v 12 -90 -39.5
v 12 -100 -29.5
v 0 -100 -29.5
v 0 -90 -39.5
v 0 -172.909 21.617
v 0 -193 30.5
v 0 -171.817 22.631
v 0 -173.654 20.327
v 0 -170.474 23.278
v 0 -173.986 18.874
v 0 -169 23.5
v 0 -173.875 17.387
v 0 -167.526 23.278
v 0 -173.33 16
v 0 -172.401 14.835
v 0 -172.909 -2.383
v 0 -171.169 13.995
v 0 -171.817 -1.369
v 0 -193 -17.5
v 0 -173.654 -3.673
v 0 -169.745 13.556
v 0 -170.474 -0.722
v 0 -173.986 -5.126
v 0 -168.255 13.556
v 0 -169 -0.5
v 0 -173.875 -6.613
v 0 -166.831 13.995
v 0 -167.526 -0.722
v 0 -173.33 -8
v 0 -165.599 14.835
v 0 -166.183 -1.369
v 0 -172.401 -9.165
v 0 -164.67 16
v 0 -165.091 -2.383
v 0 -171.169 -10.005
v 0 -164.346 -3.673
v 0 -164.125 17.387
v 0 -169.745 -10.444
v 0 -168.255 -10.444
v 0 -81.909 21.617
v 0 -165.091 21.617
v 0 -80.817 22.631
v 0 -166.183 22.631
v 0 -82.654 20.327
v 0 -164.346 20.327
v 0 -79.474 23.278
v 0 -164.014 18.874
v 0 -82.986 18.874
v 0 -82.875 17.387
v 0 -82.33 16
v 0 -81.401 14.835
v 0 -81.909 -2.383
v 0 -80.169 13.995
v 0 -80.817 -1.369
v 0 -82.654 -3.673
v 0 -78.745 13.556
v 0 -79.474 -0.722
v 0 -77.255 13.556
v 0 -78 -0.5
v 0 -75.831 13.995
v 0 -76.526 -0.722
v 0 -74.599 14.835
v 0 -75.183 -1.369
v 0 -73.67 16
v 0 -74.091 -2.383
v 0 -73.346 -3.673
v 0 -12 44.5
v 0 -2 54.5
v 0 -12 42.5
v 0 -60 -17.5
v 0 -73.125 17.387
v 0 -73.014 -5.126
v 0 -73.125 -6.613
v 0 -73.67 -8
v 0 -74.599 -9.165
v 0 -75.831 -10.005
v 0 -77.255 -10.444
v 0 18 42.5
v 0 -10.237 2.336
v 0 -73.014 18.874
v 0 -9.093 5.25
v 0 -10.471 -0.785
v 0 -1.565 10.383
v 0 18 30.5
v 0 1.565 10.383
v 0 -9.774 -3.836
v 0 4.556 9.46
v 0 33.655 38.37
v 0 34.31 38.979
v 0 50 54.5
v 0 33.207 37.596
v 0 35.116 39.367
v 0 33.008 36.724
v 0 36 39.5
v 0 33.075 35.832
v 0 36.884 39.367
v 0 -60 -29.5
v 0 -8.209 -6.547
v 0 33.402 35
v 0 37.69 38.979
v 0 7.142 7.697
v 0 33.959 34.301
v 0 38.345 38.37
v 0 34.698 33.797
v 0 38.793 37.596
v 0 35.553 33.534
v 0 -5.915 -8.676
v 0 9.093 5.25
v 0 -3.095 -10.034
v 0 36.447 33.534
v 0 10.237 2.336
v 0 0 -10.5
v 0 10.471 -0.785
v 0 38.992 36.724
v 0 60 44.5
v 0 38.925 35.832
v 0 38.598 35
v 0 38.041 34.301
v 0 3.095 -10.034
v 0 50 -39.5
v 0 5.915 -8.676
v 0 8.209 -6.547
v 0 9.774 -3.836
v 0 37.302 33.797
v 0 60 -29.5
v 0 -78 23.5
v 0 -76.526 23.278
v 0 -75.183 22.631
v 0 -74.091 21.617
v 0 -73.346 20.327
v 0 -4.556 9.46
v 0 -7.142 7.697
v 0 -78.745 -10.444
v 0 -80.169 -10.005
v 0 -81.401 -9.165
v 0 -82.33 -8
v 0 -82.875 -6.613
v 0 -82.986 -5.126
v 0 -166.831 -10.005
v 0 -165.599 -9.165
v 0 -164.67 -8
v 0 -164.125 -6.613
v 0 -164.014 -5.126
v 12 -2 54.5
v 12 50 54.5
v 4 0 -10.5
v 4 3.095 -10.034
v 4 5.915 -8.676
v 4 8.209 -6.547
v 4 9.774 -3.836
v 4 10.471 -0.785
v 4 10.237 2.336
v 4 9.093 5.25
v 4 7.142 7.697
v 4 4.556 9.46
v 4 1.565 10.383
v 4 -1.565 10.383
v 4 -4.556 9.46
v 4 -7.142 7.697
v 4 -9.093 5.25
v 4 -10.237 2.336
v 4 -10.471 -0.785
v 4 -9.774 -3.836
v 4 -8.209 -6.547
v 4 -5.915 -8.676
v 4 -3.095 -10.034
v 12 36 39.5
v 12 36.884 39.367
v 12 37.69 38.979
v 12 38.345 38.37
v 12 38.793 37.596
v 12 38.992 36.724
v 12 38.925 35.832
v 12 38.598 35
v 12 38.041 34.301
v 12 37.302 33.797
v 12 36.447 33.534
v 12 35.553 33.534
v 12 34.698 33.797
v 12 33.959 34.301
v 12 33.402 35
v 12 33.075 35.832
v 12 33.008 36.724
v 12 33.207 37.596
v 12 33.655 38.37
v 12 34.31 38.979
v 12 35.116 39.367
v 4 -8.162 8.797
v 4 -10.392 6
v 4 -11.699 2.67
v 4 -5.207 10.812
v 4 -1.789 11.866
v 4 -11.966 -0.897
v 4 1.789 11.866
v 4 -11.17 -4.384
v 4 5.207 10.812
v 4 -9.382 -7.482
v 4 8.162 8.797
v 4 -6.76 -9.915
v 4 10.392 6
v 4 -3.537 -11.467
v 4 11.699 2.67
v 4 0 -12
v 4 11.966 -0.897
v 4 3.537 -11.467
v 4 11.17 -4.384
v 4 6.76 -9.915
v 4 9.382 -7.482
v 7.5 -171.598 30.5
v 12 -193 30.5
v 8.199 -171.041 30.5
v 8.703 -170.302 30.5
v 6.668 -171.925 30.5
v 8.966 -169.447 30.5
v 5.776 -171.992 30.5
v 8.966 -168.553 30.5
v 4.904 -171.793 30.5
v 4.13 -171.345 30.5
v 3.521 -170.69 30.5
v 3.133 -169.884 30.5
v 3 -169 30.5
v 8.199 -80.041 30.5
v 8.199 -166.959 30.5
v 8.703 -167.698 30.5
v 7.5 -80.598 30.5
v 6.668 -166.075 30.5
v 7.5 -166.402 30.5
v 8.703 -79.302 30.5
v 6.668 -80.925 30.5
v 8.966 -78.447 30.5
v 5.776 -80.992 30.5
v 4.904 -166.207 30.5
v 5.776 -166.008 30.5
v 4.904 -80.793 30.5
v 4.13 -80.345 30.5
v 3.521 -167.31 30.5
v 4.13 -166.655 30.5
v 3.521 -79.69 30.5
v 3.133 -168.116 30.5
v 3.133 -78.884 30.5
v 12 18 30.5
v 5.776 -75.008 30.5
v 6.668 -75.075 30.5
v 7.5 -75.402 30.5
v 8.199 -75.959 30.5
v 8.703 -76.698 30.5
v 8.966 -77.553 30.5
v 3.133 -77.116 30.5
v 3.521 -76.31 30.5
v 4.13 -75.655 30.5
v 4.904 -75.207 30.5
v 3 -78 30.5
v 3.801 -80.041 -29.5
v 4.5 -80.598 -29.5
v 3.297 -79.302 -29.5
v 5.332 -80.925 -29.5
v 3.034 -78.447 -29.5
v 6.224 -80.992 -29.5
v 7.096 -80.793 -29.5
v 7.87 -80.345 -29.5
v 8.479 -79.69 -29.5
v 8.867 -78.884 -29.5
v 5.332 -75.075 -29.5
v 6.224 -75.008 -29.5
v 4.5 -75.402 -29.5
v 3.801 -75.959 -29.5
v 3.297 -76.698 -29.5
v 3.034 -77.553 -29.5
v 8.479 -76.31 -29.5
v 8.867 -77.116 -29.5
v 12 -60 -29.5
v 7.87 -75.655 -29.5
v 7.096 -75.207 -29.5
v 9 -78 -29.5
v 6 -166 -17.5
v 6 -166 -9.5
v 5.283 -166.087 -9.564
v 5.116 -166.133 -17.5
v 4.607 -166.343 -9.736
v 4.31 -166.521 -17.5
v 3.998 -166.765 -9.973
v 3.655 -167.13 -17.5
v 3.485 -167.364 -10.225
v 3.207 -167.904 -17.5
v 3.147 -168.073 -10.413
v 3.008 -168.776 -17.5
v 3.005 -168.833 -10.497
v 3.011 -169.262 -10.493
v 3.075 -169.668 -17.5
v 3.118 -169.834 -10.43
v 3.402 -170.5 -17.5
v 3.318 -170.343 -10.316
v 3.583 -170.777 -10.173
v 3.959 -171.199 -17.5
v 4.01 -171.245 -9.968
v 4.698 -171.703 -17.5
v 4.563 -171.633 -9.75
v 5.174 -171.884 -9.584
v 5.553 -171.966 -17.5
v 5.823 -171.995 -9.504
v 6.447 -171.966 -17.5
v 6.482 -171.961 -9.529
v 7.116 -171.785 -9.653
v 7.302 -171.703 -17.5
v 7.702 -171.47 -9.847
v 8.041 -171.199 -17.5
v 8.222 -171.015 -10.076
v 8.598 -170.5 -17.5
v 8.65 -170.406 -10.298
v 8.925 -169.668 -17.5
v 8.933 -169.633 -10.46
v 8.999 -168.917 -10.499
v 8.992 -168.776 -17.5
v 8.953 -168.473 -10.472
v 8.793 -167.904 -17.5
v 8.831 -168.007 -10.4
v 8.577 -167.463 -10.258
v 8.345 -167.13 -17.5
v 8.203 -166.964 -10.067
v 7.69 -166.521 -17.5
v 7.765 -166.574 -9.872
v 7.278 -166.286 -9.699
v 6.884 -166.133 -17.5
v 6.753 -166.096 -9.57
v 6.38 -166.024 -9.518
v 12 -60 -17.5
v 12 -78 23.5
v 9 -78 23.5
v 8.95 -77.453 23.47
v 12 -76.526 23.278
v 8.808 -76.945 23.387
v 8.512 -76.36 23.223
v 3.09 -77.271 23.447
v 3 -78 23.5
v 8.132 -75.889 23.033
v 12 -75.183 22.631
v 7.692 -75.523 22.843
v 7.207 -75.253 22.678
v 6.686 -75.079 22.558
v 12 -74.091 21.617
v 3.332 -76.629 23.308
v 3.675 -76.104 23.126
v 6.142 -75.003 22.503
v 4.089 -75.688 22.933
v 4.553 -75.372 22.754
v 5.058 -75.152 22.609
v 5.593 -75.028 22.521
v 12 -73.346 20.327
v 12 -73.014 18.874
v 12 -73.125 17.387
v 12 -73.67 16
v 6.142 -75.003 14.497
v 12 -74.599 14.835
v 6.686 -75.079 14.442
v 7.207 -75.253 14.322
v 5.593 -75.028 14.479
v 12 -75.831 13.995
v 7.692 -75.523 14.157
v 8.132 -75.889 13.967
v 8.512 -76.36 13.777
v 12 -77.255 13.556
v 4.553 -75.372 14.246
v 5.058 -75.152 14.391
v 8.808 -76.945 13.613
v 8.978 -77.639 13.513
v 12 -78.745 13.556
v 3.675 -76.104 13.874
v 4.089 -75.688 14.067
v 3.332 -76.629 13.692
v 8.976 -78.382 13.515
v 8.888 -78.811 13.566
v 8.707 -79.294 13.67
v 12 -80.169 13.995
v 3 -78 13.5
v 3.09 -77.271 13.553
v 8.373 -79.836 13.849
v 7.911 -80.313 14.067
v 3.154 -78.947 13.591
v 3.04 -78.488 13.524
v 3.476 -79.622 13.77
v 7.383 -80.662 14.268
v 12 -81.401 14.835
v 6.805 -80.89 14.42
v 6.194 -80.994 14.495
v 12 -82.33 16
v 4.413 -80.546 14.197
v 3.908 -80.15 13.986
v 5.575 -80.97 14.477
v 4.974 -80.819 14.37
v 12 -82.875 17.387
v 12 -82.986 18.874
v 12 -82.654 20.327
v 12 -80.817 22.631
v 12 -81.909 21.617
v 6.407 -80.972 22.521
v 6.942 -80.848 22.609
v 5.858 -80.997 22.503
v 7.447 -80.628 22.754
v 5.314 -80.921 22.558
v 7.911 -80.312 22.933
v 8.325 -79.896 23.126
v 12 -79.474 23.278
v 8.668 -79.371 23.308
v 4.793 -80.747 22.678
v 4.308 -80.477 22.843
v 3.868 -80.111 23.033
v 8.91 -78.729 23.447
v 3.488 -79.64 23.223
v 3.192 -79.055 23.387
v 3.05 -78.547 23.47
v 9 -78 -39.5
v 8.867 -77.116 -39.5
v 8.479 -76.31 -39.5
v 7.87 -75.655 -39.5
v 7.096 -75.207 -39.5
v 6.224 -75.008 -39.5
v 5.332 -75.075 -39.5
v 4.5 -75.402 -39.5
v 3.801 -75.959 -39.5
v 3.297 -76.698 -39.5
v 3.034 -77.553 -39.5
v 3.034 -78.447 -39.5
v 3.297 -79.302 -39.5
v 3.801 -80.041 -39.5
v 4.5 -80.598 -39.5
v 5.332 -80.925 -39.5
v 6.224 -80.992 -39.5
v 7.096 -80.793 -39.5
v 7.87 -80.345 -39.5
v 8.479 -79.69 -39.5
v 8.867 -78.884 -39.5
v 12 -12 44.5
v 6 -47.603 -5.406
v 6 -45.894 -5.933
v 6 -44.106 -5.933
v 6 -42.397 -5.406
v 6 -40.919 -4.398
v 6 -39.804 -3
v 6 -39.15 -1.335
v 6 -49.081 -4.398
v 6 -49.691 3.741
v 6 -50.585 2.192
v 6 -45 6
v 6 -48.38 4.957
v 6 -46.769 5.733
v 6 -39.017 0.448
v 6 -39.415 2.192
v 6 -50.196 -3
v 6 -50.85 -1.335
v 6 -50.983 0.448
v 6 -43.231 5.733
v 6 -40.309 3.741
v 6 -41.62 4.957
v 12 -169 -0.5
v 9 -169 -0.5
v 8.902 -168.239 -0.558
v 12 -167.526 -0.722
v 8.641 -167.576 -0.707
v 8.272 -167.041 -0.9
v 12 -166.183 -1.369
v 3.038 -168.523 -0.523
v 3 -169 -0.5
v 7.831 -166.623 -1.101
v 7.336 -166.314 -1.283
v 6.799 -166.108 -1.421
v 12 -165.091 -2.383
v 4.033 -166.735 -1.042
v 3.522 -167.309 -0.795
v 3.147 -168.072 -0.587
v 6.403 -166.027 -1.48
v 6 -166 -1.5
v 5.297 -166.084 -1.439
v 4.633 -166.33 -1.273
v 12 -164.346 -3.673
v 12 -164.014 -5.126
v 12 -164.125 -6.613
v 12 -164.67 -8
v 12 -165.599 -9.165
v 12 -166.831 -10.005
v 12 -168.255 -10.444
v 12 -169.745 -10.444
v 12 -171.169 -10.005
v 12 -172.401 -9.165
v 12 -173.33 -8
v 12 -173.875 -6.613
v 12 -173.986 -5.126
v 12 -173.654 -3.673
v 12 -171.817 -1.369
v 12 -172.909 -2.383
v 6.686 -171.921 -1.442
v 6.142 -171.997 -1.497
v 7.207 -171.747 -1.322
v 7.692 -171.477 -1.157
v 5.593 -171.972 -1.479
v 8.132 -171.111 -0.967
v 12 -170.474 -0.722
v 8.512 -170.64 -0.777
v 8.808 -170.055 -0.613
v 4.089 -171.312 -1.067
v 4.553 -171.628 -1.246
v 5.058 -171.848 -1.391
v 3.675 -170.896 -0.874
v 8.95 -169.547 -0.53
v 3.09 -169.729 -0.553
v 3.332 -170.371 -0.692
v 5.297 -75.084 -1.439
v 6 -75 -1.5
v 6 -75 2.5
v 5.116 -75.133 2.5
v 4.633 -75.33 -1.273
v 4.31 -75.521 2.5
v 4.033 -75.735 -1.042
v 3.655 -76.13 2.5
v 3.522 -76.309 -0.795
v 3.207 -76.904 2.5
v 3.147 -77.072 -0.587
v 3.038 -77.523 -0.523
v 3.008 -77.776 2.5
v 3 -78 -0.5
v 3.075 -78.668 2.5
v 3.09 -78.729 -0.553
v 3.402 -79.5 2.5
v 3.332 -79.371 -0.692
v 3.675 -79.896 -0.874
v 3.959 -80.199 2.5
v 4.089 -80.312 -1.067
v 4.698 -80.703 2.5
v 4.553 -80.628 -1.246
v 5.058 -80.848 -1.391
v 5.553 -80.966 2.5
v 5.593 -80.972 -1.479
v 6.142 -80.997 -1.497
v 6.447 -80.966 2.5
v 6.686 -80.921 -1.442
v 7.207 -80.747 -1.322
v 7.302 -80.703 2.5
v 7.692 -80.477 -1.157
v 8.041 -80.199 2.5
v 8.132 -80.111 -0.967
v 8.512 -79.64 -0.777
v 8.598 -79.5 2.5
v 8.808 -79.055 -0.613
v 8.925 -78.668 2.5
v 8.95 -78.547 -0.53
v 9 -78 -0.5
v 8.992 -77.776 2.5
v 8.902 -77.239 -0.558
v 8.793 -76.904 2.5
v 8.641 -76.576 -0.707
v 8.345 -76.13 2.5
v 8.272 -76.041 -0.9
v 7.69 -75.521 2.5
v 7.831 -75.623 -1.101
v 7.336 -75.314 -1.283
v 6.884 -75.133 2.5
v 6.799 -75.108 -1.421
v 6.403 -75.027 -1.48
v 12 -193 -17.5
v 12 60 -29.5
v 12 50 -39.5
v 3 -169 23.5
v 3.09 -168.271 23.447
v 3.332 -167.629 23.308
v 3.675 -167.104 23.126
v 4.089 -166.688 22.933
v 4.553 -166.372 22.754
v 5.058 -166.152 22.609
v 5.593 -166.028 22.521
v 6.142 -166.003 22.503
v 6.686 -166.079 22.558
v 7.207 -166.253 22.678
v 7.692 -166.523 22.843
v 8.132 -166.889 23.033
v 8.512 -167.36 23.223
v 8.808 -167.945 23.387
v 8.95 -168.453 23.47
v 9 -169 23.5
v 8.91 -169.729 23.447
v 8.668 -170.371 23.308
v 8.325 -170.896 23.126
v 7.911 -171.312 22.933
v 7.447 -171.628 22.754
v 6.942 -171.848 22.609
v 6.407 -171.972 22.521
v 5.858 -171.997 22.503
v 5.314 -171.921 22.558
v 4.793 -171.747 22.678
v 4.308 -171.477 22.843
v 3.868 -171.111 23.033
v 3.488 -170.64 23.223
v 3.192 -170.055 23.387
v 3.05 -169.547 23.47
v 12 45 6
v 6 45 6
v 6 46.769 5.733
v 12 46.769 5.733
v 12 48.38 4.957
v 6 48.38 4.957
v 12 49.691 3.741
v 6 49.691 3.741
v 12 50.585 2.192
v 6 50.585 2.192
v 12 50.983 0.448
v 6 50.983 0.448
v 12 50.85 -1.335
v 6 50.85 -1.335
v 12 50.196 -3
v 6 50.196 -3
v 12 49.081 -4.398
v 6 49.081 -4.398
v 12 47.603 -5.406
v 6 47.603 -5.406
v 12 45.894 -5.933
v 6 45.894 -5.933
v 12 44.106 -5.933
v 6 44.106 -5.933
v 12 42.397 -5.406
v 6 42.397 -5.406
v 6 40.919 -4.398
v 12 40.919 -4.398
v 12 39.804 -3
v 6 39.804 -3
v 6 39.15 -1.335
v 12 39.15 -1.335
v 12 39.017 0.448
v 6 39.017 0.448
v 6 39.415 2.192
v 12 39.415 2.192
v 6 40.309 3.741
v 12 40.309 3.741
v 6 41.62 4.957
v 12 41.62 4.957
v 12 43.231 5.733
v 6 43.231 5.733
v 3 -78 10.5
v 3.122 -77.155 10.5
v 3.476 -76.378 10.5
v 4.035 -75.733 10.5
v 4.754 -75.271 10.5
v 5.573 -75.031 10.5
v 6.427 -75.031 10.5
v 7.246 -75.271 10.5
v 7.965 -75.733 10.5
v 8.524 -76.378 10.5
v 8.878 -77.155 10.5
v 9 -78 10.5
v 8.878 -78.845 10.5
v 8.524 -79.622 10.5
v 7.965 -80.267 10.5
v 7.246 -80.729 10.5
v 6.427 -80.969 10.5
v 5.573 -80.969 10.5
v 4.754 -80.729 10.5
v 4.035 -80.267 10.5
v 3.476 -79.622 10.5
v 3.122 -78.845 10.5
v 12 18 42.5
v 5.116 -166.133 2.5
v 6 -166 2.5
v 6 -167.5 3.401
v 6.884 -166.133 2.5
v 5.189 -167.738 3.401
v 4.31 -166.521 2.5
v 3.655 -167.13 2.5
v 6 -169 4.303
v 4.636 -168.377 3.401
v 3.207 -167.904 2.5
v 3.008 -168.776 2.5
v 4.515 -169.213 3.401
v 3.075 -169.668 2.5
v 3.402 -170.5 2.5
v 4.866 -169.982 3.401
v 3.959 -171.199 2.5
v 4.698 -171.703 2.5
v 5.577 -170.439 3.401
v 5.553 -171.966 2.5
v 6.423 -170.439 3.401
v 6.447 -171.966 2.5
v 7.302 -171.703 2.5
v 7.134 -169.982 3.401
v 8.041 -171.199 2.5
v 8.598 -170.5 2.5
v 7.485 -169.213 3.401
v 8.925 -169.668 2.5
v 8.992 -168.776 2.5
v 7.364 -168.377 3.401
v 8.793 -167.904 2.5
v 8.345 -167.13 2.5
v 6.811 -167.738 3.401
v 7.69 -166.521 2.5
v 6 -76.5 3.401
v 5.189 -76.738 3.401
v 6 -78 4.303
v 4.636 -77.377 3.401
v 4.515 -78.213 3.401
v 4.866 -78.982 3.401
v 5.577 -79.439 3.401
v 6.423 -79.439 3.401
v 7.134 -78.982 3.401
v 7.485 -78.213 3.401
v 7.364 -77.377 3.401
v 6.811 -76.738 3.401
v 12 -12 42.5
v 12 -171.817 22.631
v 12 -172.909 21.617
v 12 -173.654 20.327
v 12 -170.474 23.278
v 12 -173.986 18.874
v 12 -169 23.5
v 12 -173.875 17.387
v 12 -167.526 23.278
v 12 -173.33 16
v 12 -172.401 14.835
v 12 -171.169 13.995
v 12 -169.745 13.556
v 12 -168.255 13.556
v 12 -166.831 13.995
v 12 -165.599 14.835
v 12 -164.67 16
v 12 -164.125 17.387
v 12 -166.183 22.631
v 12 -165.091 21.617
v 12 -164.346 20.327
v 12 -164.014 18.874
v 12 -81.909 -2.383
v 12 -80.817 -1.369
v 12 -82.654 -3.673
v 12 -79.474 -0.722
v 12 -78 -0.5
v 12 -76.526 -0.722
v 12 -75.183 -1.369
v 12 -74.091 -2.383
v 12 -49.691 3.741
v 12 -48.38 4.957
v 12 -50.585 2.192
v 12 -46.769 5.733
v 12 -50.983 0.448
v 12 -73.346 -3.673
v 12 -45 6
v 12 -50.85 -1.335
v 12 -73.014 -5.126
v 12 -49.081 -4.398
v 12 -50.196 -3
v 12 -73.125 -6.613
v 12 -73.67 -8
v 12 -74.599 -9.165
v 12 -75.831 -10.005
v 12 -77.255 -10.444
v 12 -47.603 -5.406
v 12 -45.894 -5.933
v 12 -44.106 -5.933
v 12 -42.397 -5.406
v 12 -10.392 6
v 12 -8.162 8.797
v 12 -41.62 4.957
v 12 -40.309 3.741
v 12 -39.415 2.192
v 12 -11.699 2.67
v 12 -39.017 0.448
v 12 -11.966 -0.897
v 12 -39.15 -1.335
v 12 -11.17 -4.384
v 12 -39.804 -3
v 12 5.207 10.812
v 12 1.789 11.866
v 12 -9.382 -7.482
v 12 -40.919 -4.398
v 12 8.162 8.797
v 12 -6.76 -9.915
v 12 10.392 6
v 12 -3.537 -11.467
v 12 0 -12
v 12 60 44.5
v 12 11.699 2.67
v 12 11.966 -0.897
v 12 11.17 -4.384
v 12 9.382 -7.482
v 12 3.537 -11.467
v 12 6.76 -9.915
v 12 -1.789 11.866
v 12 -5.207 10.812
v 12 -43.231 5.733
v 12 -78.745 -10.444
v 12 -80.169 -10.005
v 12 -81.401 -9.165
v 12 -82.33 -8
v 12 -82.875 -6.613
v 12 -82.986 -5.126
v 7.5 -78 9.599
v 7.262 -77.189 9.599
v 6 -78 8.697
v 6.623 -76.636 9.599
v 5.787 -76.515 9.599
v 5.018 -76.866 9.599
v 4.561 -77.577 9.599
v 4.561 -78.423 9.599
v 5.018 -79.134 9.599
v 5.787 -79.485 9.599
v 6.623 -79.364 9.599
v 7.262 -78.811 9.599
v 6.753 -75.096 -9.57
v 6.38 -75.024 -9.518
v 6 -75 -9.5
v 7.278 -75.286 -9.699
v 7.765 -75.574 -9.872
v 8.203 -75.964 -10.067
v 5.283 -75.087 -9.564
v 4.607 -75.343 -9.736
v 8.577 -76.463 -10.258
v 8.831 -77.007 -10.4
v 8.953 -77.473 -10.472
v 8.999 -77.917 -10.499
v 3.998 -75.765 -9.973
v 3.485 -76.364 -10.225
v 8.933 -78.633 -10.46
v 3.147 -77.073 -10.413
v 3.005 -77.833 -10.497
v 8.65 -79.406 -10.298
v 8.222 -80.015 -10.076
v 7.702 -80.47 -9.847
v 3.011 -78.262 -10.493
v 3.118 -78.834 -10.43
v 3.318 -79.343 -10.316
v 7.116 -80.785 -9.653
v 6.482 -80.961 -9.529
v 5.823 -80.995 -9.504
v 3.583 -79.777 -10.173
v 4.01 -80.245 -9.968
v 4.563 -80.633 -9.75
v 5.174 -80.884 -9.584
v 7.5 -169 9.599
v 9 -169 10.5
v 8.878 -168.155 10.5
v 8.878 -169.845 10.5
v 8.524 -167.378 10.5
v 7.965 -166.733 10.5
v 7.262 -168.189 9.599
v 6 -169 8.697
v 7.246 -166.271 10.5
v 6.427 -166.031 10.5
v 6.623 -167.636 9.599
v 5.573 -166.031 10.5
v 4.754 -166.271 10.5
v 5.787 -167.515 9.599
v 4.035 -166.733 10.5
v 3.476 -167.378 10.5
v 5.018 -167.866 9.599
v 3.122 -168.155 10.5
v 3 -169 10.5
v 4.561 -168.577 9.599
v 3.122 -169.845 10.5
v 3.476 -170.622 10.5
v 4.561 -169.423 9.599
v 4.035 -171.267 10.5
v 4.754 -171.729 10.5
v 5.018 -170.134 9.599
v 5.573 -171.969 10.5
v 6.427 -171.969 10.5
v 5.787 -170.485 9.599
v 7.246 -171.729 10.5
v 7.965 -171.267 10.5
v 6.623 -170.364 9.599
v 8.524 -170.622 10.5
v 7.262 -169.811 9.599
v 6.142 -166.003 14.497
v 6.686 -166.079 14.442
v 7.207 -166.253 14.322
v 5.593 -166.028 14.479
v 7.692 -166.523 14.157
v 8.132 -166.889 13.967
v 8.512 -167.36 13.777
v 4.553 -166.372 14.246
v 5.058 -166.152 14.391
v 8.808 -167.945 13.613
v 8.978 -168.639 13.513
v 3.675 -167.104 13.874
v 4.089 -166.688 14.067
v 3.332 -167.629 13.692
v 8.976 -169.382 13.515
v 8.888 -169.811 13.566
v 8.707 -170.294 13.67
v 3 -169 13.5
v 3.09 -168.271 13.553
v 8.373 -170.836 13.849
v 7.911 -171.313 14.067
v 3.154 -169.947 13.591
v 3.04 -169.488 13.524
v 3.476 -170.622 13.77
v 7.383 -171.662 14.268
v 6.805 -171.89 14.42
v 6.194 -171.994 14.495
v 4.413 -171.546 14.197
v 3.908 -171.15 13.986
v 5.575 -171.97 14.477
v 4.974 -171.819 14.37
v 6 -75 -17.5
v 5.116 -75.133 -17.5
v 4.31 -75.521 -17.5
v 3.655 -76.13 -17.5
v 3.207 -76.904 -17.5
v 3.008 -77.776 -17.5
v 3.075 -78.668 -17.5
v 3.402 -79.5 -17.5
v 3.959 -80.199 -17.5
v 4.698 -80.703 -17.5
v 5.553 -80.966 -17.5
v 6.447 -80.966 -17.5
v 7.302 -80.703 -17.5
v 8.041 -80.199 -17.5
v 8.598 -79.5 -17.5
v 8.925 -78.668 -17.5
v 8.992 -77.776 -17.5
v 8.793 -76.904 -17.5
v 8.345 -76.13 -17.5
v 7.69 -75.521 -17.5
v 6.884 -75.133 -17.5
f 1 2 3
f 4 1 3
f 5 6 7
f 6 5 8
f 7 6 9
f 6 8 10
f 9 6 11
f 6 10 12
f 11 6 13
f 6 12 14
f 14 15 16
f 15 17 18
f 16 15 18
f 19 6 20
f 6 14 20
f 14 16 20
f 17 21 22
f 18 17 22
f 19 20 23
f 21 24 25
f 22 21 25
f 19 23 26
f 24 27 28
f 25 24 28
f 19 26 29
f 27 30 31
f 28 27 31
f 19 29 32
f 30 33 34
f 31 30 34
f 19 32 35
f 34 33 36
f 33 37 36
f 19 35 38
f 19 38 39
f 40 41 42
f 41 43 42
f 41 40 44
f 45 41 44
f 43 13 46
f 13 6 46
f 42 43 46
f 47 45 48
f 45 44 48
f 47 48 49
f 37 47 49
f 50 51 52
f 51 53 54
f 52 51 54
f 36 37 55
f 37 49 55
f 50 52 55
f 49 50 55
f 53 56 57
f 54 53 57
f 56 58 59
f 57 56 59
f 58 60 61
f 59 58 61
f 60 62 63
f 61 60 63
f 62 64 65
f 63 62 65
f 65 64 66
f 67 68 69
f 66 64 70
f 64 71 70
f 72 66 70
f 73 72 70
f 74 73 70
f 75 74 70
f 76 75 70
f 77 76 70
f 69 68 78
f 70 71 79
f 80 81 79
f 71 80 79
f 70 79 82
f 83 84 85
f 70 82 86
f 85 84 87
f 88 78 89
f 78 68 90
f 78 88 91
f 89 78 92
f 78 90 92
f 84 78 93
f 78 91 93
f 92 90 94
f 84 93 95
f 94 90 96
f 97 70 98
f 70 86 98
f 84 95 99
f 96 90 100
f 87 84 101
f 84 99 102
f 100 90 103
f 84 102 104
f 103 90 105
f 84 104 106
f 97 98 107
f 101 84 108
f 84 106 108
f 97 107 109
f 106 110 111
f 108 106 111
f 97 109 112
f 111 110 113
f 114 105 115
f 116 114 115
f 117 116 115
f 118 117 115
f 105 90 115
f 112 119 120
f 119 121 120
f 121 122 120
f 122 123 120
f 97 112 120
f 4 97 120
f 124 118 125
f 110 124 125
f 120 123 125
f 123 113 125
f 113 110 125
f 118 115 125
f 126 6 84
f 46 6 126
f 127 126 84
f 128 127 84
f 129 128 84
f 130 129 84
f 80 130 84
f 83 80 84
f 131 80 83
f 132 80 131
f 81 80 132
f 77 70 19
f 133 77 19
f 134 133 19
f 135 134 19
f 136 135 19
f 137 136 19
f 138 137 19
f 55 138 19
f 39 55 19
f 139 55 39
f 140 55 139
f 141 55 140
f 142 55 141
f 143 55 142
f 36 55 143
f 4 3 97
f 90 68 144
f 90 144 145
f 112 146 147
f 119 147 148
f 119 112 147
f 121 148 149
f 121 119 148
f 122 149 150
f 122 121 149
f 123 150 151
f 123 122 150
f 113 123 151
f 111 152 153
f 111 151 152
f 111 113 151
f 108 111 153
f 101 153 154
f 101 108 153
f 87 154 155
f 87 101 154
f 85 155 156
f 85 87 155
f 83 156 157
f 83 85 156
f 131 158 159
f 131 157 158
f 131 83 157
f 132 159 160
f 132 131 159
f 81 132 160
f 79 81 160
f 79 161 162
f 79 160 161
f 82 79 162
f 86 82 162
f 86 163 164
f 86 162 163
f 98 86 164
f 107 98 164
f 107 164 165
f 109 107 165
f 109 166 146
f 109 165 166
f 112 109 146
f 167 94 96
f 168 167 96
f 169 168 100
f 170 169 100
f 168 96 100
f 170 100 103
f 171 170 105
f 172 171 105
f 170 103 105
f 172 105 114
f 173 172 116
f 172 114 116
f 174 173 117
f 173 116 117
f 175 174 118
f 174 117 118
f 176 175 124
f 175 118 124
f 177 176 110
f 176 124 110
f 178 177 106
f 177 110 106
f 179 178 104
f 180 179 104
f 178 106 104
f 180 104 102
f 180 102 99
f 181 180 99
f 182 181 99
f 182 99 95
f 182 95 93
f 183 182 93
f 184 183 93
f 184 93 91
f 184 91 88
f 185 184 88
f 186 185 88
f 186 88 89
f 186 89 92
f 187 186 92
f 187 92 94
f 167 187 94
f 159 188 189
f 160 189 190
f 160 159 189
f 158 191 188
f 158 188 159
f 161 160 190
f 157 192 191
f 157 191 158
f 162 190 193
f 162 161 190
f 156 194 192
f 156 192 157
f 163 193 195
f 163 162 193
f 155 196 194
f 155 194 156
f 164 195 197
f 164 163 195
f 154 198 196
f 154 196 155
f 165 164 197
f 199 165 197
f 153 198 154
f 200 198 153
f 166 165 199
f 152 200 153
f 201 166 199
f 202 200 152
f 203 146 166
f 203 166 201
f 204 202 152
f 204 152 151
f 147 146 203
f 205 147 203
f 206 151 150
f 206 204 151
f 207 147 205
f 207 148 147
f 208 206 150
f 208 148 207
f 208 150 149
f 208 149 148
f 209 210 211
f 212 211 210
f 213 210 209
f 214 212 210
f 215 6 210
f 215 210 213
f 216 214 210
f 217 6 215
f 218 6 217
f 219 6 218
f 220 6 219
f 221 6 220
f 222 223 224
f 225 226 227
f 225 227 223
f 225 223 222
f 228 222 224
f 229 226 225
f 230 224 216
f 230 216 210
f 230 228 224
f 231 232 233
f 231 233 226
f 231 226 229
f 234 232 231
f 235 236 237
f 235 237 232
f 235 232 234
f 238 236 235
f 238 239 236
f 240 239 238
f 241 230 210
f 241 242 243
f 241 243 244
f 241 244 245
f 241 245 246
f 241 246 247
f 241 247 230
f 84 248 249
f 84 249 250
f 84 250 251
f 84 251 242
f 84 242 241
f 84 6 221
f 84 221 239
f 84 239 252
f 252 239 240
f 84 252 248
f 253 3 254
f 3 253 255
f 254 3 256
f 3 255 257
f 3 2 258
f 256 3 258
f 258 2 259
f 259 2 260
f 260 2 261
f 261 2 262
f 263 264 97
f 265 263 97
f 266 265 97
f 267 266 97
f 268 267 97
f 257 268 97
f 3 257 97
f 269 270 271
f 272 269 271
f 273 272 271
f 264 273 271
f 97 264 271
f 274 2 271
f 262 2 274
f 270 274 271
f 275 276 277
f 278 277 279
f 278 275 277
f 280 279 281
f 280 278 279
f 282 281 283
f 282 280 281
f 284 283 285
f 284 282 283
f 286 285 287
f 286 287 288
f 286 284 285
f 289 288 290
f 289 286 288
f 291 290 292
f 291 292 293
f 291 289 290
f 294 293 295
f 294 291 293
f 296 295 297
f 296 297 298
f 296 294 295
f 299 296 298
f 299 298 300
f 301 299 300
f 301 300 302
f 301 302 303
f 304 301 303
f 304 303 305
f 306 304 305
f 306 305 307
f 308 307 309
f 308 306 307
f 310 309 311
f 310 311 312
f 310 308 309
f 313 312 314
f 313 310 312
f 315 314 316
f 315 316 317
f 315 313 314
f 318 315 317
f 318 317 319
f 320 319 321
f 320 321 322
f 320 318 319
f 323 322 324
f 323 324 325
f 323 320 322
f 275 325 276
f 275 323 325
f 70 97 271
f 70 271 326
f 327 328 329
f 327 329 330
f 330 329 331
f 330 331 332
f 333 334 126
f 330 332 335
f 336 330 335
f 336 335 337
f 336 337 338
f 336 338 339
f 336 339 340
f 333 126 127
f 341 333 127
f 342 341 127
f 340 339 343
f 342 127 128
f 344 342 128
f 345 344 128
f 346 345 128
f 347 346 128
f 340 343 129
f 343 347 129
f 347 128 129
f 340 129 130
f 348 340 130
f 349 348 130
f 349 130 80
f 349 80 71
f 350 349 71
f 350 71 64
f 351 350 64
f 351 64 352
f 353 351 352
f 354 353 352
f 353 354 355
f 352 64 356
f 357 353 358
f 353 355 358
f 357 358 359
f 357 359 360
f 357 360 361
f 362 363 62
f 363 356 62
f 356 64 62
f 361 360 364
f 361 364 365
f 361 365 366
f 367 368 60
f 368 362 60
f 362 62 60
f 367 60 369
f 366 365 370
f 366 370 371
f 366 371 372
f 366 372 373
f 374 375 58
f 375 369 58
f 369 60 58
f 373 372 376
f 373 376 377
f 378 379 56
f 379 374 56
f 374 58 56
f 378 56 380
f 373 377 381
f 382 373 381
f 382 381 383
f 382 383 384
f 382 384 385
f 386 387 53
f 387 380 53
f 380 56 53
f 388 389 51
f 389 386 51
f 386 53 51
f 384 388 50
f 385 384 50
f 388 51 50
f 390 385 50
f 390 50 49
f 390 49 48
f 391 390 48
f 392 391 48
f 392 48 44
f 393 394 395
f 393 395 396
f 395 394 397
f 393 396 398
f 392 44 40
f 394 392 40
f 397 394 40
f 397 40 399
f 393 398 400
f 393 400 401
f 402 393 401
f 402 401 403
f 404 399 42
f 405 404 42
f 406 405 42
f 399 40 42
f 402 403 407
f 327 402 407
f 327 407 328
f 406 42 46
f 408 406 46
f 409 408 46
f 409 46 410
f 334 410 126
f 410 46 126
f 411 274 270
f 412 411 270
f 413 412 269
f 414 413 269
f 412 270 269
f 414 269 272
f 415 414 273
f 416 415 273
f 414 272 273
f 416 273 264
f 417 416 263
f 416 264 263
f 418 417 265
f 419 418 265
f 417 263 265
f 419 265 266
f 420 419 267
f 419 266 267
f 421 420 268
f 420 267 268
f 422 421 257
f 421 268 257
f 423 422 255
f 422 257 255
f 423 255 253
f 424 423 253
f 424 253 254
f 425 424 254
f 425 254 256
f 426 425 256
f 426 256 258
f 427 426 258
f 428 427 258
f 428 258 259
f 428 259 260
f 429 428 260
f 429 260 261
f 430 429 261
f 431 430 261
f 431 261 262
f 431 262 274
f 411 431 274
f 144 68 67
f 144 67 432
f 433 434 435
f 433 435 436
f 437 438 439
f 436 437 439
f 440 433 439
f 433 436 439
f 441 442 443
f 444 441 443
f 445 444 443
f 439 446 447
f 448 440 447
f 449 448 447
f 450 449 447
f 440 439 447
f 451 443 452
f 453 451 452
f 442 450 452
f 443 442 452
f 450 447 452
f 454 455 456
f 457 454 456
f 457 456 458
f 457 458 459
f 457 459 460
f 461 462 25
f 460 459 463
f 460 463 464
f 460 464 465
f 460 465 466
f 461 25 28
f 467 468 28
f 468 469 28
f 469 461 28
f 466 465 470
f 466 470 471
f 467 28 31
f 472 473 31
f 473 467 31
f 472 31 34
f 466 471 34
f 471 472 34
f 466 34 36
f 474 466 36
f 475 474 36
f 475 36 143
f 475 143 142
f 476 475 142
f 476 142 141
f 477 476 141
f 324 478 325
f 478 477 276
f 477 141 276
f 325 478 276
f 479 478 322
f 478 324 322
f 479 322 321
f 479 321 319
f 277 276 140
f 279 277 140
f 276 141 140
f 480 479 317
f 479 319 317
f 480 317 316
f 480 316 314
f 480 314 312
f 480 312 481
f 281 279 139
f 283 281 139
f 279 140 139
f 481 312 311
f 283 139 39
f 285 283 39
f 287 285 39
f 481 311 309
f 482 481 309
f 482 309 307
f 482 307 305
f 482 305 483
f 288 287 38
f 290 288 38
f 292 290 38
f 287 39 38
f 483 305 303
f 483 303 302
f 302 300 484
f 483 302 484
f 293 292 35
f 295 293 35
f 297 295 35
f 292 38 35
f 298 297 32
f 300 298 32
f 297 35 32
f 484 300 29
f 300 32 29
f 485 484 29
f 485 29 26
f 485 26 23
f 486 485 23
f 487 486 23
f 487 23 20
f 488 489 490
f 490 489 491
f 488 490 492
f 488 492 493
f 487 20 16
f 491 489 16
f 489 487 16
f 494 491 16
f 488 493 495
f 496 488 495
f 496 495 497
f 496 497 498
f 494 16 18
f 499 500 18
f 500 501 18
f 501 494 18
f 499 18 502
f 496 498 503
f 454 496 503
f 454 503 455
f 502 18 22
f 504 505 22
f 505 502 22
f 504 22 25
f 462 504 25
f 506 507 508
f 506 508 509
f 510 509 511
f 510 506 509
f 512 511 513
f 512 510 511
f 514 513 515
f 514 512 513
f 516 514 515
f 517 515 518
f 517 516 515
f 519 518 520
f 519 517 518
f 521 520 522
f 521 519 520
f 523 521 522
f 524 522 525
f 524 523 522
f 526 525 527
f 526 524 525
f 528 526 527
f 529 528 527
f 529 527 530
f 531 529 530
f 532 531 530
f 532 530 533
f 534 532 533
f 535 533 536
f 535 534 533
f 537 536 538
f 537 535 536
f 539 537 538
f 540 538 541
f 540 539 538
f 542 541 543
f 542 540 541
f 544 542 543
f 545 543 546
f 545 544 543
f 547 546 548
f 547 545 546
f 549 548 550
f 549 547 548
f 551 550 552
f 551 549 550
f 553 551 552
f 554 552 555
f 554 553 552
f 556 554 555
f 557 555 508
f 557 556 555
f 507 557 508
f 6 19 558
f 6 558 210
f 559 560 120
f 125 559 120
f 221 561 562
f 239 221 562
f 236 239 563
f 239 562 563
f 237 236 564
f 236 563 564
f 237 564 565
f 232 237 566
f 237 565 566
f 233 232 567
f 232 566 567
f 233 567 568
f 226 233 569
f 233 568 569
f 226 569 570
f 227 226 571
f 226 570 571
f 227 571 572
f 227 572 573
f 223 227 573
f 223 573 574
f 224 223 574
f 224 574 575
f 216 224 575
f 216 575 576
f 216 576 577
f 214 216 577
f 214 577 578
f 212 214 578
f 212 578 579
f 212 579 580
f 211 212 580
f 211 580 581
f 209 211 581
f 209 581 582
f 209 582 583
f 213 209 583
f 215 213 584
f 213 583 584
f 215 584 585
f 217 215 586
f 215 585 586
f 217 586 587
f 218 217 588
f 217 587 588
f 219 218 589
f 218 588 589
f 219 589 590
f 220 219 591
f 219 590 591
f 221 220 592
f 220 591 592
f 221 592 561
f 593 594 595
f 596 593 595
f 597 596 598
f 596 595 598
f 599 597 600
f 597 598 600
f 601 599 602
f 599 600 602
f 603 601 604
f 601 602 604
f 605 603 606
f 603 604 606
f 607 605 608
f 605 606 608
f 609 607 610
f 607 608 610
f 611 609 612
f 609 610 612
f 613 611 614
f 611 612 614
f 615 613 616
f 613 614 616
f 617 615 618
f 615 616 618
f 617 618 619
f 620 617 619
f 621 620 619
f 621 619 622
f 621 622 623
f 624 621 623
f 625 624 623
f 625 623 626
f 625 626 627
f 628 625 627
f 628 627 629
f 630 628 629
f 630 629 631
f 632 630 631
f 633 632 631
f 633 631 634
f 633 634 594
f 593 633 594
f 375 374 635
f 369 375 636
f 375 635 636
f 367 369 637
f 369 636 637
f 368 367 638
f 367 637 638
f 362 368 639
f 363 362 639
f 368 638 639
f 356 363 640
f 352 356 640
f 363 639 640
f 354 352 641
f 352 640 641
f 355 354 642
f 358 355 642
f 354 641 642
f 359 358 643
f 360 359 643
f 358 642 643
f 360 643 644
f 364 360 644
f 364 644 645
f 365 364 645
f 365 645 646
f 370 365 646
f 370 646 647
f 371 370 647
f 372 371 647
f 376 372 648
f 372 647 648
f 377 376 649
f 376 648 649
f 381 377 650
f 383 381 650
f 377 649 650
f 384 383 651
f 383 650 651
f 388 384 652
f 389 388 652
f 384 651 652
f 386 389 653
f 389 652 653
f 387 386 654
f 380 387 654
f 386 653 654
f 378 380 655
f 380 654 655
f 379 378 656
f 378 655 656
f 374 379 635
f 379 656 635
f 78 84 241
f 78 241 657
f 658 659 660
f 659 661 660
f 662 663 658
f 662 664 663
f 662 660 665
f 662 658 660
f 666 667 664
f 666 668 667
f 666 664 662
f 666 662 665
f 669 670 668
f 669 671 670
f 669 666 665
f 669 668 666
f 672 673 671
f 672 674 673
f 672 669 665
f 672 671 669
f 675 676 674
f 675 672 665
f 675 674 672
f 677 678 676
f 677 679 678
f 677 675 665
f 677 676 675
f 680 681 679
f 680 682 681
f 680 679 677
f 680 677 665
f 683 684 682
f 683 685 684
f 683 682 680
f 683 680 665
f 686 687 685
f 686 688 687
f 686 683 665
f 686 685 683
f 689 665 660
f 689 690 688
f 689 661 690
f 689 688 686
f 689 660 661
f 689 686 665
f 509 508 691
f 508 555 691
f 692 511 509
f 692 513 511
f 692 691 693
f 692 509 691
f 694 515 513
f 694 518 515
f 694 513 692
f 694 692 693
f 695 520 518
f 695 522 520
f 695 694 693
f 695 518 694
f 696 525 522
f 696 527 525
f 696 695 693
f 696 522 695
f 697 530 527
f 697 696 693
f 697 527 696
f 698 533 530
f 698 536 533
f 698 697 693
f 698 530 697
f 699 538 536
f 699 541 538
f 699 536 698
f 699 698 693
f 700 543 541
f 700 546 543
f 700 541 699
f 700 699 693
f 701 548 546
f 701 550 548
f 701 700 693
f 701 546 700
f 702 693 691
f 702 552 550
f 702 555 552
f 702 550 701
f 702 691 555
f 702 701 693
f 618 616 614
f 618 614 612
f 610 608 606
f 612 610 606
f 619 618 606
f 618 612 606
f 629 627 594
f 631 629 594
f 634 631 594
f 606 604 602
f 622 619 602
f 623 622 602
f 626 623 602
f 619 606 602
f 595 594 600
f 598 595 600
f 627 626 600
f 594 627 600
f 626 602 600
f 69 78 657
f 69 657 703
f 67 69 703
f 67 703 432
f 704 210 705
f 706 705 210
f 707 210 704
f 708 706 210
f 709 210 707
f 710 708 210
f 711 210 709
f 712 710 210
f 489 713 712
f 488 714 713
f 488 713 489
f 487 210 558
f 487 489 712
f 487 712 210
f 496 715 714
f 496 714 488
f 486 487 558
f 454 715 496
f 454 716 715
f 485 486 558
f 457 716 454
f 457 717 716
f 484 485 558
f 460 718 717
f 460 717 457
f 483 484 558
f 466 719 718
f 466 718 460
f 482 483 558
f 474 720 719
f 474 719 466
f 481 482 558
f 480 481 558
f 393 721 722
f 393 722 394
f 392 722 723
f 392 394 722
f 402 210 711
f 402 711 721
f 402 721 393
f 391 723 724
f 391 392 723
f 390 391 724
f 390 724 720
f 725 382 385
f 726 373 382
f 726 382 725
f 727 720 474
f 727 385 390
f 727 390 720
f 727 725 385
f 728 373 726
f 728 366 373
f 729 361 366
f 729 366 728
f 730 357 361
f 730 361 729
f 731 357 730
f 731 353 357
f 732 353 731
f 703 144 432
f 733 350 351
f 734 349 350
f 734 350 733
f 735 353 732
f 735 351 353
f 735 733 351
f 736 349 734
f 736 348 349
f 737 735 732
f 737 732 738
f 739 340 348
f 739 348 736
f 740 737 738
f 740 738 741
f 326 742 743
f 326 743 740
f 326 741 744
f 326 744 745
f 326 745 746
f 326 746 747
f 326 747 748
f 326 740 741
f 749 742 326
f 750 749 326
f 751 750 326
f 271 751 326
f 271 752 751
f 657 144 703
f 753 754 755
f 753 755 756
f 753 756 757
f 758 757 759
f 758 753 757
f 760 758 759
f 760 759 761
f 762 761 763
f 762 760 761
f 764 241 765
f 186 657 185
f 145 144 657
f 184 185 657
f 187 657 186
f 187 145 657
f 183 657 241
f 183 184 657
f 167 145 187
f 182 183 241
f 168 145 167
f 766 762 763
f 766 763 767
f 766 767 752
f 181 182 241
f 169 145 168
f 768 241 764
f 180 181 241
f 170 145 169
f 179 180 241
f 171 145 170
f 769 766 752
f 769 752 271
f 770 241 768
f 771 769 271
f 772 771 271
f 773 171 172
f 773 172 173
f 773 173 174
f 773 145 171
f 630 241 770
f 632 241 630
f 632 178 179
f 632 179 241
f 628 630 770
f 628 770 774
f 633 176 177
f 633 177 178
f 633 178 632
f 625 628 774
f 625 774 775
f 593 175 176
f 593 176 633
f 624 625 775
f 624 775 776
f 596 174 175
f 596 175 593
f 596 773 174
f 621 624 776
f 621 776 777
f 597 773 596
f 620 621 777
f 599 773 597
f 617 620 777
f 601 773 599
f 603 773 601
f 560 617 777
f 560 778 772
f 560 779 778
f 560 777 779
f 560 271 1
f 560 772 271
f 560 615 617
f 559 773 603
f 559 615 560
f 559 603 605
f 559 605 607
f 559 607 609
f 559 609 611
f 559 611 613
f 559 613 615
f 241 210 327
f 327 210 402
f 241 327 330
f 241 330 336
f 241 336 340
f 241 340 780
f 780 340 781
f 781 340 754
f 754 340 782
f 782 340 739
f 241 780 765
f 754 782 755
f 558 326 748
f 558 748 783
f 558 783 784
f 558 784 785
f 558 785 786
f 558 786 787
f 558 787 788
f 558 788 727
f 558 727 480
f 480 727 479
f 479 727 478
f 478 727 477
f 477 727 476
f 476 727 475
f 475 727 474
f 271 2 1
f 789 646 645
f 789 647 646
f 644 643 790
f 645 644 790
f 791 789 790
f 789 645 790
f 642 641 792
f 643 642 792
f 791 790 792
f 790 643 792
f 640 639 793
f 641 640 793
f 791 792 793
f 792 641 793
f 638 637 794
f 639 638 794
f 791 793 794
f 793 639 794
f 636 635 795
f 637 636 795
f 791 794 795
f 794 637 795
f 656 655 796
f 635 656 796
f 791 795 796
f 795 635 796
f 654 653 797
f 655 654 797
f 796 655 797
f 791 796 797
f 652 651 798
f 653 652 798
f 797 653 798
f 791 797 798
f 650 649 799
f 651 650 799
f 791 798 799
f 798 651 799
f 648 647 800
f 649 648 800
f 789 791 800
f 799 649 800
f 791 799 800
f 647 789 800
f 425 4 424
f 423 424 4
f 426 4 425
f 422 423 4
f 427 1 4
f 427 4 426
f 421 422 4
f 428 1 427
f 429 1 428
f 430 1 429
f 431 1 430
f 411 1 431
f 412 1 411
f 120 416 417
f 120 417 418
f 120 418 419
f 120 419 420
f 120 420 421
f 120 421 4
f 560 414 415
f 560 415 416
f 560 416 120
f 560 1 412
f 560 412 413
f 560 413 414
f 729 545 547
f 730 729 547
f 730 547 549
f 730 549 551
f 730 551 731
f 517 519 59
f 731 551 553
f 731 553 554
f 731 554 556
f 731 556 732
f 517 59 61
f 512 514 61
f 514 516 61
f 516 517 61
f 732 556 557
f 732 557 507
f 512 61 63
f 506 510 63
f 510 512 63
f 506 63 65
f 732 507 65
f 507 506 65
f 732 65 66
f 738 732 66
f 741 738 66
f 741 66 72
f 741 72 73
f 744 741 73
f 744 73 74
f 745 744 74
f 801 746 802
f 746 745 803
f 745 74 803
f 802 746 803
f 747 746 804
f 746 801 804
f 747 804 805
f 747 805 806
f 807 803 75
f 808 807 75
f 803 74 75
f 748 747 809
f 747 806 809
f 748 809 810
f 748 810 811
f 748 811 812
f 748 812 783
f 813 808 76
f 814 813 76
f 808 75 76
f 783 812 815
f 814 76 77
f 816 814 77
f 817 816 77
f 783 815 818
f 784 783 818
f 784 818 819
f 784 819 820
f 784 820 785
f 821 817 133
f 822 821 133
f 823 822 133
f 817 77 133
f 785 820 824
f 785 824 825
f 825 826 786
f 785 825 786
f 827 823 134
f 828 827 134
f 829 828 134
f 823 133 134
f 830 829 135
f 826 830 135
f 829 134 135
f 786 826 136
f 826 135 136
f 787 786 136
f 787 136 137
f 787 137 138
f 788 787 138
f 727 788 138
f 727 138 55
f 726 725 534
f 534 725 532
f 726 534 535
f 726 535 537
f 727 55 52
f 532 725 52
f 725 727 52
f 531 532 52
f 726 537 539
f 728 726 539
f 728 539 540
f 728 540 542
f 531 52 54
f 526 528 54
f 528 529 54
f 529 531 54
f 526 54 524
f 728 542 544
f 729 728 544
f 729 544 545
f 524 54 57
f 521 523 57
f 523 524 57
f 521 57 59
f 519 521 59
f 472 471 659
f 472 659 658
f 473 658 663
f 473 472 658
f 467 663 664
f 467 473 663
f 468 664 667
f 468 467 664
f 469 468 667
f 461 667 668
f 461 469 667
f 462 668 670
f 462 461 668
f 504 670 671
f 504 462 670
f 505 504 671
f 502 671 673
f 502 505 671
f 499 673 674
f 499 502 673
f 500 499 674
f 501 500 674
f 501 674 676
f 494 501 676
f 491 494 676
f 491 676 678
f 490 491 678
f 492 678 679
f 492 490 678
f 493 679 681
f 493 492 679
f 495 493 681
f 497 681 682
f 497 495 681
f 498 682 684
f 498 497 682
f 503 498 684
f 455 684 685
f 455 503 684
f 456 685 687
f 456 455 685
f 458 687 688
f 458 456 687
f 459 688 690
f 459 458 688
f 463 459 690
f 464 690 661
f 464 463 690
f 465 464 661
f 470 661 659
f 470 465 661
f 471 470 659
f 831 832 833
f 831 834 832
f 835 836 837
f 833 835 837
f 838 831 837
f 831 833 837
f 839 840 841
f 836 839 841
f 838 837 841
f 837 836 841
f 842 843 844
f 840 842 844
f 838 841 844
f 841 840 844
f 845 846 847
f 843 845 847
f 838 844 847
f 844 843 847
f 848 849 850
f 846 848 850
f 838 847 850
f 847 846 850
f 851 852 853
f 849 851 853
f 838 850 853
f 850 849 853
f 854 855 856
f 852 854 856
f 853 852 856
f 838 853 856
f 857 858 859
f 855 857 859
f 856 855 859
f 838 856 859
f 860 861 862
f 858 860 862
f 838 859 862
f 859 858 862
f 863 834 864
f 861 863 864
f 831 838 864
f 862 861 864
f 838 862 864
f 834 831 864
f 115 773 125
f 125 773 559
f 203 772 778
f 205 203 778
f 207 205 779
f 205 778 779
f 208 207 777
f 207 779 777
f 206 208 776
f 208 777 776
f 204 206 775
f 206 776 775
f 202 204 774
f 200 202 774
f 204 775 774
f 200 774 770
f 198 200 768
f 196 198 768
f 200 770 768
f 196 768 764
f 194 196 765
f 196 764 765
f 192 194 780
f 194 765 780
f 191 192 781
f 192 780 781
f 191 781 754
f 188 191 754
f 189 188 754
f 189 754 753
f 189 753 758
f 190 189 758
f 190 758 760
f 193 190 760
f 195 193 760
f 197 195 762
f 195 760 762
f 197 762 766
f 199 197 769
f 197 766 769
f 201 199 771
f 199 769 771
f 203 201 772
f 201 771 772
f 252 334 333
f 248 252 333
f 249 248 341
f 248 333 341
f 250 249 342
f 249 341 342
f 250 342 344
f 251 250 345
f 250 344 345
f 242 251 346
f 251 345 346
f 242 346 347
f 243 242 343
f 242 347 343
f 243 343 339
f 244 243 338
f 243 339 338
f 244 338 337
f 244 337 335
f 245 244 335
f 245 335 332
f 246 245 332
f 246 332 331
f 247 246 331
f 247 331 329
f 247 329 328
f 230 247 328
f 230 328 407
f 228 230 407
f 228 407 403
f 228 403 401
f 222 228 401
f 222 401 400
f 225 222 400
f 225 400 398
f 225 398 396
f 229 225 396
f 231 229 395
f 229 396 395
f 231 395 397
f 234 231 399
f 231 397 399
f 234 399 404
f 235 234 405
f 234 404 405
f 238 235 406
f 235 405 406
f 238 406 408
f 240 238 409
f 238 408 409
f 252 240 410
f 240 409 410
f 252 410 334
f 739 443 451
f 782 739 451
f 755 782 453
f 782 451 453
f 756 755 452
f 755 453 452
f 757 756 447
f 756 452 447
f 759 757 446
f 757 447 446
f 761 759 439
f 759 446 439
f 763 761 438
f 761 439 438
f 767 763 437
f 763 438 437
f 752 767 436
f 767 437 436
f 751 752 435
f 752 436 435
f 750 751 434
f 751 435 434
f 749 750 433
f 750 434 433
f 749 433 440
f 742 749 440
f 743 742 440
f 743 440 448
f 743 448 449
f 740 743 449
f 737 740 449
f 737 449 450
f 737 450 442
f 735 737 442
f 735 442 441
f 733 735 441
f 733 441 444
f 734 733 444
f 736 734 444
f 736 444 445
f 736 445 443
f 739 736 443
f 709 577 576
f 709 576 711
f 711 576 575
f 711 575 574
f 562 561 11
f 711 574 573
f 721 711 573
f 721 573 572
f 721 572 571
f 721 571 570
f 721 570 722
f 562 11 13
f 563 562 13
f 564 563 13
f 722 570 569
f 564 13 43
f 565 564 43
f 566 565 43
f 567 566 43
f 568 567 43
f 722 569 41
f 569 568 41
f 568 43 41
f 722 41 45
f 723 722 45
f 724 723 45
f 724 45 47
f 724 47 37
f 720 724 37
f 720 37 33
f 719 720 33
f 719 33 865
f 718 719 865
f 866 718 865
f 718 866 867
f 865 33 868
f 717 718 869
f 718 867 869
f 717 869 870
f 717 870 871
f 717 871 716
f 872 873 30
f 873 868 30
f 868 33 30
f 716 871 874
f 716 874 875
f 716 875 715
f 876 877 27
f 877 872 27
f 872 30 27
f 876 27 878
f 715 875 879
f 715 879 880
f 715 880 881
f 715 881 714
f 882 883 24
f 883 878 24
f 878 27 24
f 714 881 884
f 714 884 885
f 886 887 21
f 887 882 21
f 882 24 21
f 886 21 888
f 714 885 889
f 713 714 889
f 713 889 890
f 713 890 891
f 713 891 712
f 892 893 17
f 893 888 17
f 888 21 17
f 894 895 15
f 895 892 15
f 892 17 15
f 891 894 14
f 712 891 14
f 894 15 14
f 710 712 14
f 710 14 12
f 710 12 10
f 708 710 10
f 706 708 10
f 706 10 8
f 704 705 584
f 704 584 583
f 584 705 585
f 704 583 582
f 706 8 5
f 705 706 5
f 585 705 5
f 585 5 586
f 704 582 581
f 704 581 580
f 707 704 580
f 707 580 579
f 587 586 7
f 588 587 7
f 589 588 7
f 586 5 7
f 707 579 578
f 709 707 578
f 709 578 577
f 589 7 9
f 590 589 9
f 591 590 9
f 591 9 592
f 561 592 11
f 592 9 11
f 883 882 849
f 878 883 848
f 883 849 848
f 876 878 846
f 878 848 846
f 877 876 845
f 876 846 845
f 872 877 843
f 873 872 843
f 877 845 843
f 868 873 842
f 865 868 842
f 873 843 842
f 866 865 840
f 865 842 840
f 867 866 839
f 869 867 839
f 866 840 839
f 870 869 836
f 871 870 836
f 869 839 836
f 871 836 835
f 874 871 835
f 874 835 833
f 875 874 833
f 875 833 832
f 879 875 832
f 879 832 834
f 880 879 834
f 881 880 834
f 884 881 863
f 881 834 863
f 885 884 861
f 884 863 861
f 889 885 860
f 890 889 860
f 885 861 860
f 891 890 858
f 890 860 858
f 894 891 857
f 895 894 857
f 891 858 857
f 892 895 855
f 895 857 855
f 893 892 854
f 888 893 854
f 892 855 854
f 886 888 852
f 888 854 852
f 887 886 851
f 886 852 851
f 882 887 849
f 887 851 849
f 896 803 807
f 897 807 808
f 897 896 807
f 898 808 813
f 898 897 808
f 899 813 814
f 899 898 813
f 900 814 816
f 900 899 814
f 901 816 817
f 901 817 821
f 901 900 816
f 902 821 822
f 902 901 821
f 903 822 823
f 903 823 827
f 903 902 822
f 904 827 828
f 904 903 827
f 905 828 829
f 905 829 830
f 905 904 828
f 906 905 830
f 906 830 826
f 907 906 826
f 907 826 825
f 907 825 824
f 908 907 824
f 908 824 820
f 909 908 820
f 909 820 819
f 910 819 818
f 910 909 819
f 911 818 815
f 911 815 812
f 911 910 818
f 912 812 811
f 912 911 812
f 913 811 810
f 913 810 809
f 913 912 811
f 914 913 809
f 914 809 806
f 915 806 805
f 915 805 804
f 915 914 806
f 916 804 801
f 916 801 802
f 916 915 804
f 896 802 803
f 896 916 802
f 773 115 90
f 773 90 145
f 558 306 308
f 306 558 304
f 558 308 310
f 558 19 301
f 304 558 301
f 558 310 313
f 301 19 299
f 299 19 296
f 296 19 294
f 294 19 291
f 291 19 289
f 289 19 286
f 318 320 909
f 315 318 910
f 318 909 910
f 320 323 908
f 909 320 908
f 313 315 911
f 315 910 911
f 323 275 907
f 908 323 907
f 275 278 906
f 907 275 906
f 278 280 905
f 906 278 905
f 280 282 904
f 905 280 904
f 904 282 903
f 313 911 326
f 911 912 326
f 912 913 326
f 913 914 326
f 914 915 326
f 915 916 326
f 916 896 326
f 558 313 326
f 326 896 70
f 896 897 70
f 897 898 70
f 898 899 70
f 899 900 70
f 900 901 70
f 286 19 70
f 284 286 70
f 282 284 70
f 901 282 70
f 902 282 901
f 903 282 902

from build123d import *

# Parameters (mm, degrees)
SKETCH1_W                         = 59
SKETCH1_H                         = 120
SKETCH1_R                         = 10.5
BOSS_EXTRUDE1_DEPTH               = 12
BOSS_EXTRUDE2_DEPTH               = 12
SKETCH9_W                         = 48
SKETCH9_H                         = 133
BOSS_EXTRUDE3_DEPTH               = 12
SKETCH11_W                        = 10
SKETCH11_H                        = 160
BOSS_EXTRUDE4_DEPTH               = 12
CHAMFER1_SIZE                     = 10
CHAMFER2_SIZE                     = 10
F_10_0_10_DIAMETER_HOLE1_D        = 10
F_6_0_6_DIAMETER_HOLE1_AT_2_COUNT = 2
F_6_0_6_DIAMETER_HOLE1_AT_2_PITCH = 91
F_6_0_6_DIAMETER_HOLE3_D          = 6
F_6_0_6_DIAMETER_HOLE3_DEPTH      = 20
F_6_0_6_DIAMETER_HOLE3_TIP        = 1.802581857
F_6_0_6_DIAMETER_HOLE4_D          = 6
F_6_0_6_DIAMETER_HOLE5_D          = 6
F_6_0_6_DIAMETER_HOLE5_DEPTH      = 20
F_6_0_6_DIAMETER_HOLE5_TIP        = 1.802581857
HOLE2_D                           = 12
HOLE2_DEPTH                       = 6
SKETCH27_R                        = 12
CUT_EXTRUDE1_DEPTH                = 8


with BuildPart() as part:
    # Sketch1 → Boss-Extrude1 (new body)
    with BuildSketch(Plane(origin=(0, 0, 0), x_dir=(0, 0, -1), z_dir=(1, 0, 0))):
        Rectangle(SKETCH1_W, SKETCH1_H)
        Circle(SKETCH1_R, mode=Mode.SUBTRACT)
    extrude(amount=BOSS_EXTRUDE1_DEPTH)

    # Sketch8 → Boss-Extrude2 (add)
    with BuildSketch(Plane.ZY):
        Polygon((42.5, 18), (42.5, -12), (54.5, -12), (54.5, 60), (29.5, 60), (29.5, -60), (30.5, -60), (30.5, 18), align=None)
    extrude(amount=-BOSS_EXTRUDE2_DEPTH)

    # Sketch9 → Boss-Extrude3 (add)
    with BuildSketch(Plane.ZY):
        with Locations((6.5, -126.5)):
            Rectangle(SKETCH9_W, SKETCH9_H)
    extrude(amount=-BOSS_EXTRUDE3_DEPTH)

    # Sketch11 → Boss-Extrude4 (add)
    with BuildSketch(Plane(origin=(12, 0, 0), x_dir=(0, 0, -1), z_dir=(1, 0, 0))):
        with Locations((34.5, -20)):
            Rectangle(SKETCH11_W, SKETCH11_H)
    extrude(amount=-BOSS_EXTRUDE4_DEPTH)

    # Chamfer1
    chamfer1_edges = [part.edges().sort_by_distance(p)[0] for p in [
        (6, 60, 54.5),
        (6, -12, 54.5),
        (6, 60, -39.5),
    ]]
    chamfer(chamfer1_edges, length=CHAMFER1_SIZE)

    # Chamfer2
    chamfer2_edges = [part.edges().sort_by_distance(p)[0] for p in [
        (6, -100, -39.5),
    ]]
    chamfer(chamfer2_edges, length=CHAMFER2_SIZE - 0.0001)  # a hair under: the kernel refuses the full size

    # Ø10.0 (10) Diameter Hole1 (through all)
    with Locations(Plane(origin=(12, 0, 0), x_dir=(0, 0, -1), z_dir=(1, 0, 0))):
        with Locations((-18.5, -169), (5.5, -169), (-18.5, -78), (5.5, -78)):
            Hole(F_10_0_10_DIAMETER_HOLE1_D / 2)

    # Sketch15 → Ø6.0 (6) Diameter Hole1 (revolve, cut)
    with BuildSketch(Plane(origin=(6, -169, -17.5), x_dir=(0, 1, 0), z_dir=(1, 0, 0))):
        Polygon((0, 0), (0, 21.802581857), (3, 20), (3, 0), align=None)
    f_6_0_6_diameter_hole1 = revolve(axis=Axis((6, -169, -23.85), (0, 0, 1)), mode=Mode.SUBTRACT)

    # Ø6.0 (6) Diameter Hole1 at 2: Ø6.0 (6) Diameter Hole1 ×2
    with Locations(*[(0, i * F_6_0_6_DIAMETER_HOLE1_AT_2_PITCH, 0) for i in range(1, F_6_0_6_DIAMETER_HOLE1_AT_2_COUNT)]):
        add(f_6_0_6_diameter_hole1, mode=Mode.SUBTRACT)

    # Ø6.0 (6) Diameter Hole3
    with Locations(Plane(origin=(0, 0, -39.5), x_dir=(-1, 0, 0), z_dir=(0, 0, -1))):
        with Locations((-6, -78)):
            Hole(F_6_0_6_DIAMETER_HOLE3_D / 2, depth=F_6_0_6_DIAMETER_HOLE3_DEPTH)
            with Locations((0, 0, -(F_6_0_6_DIAMETER_HOLE3_DEPTH + F_6_0_6_DIAMETER_HOLE3_TIP / 2))):  # 118° drill point
                Cone(0, F_6_0_6_DIAMETER_HOLE3_D / 2, F_6_0_6_DIAMETER_HOLE3_TIP, mode=Mode.SUBTRACT)

    # Ø6.0 (6) Diameter Hole4 (through all)
    with Locations(Plane(origin=(12, 0, 0), x_dir=(0, 0, -1), z_dir=(1, 0, 0))):
        with Locations((-36.5, 36)):
            Hole(F_6_0_6_DIAMETER_HOLE4_D / 2)

    # Ø6.0 (6) Diameter Hole5
    with Locations(Plane.XY.offset(30.5)):
        with Locations((6, -78), (6, -169)):
            Hole(F_6_0_6_DIAMETER_HOLE5_D / 2, depth=F_6_0_6_DIAMETER_HOLE5_DEPTH)
            with Locations((0, 0, -(F_6_0_6_DIAMETER_HOLE5_DEPTH + F_6_0_6_DIAMETER_HOLE5_TIP / 2))):  # 118° drill point
                Cone(0, F_6_0_6_DIAMETER_HOLE5_D / 2, F_6_0_6_DIAMETER_HOLE5_TIP, mode=Mode.SUBTRACT)

    # Hole2
    with Locations(Plane(origin=(12, 0, 0), x_dir=(0, 0, -1), z_dir=(1, 0, 0))):
        with Locations((0, -45), (0, 45)):
            Hole(HOLE2_D / 2, depth=HOLE2_DEPTH)

    # Sketch27 → Cut-Extrude1 (cut)
    with BuildSketch(Plane(origin=(12, 0, 0), x_dir=(0, 0, -1), z_dir=(1, 0, 0))):
        Circle(SKETCH27_R)
    extrude(amount=-CUT_EXTRUDE1_DEPTH, mode=Mode.SUBTRACT)


solid = part.part
